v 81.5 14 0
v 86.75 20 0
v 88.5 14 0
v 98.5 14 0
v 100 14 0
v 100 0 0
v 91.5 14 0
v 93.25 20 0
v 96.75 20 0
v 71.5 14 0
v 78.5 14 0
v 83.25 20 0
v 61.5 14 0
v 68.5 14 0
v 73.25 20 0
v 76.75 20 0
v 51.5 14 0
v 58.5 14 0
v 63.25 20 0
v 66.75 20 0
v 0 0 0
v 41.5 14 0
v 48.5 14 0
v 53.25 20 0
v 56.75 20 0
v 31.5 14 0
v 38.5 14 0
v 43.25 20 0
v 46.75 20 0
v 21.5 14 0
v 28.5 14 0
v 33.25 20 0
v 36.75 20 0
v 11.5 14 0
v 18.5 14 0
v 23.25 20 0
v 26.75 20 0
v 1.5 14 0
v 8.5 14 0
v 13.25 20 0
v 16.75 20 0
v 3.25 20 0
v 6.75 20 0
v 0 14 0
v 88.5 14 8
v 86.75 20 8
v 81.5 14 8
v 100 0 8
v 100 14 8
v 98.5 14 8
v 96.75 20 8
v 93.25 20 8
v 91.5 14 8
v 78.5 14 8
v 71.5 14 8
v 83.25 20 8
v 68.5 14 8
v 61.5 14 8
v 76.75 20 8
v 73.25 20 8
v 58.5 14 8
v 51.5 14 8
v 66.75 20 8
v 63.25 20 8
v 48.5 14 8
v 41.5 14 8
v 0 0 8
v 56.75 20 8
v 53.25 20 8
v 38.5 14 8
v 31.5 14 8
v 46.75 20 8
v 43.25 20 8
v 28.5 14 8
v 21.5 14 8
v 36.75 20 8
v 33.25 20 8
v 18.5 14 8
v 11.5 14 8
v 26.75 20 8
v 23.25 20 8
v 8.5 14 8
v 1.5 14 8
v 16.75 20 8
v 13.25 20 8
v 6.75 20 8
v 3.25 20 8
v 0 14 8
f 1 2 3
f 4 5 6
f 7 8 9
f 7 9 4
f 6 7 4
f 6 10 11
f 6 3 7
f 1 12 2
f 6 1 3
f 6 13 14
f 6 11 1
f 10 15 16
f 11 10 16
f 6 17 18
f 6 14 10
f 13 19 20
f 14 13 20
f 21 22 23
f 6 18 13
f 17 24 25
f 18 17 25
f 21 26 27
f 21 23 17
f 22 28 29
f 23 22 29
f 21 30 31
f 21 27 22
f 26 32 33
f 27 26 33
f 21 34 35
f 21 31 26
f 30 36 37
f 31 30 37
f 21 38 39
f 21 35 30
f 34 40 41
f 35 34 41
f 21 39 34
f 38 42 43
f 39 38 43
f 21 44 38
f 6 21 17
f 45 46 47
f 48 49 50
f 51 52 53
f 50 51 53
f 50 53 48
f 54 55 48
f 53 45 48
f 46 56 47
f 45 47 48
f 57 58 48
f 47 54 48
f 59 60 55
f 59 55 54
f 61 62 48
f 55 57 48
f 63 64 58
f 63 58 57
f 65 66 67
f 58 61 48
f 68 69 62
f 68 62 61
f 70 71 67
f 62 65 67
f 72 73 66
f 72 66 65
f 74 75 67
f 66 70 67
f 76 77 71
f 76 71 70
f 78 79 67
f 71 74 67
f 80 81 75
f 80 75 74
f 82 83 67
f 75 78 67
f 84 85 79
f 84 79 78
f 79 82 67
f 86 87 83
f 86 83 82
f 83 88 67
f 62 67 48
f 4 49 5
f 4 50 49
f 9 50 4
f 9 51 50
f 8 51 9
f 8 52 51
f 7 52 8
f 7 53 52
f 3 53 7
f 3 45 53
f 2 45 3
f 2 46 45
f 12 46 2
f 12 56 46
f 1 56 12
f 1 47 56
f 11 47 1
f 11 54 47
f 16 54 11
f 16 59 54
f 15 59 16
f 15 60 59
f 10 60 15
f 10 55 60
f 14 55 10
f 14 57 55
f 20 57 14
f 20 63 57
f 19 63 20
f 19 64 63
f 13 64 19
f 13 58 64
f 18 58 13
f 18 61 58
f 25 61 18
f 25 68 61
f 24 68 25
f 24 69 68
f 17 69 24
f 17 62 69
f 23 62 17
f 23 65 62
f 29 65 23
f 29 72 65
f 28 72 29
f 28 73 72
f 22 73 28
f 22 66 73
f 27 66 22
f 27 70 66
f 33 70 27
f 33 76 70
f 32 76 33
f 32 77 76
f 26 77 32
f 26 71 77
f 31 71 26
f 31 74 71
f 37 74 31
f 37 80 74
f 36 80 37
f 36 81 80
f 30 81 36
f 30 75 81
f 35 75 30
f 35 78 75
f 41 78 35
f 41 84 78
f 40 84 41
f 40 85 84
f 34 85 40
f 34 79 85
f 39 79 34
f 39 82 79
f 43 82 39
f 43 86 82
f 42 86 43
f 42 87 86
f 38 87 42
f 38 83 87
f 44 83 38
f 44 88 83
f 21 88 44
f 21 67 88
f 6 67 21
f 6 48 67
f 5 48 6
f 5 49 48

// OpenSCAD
$fn = 32;

// ----------------------------------------------------------------------
// Gear rack: 10 teeth, pitch 10 mm
// ----------------------------------------------------------------------

// --- parameters (mm) ---
teeth = 10;               // number of teeth
pitch = 10;               // tooth pitch, X
root_w = 7;               // tooth width at the root
tip_w = 3.5;              // tooth width at the tip
base_h = 14;              // rack body height, Y
tooth_h = 6;              // tooth height above the body
plate_t = 8;              // rack width, Z (extrusion height)

rack_l = teeth * pitch;  // overall length
total_h = base_h + tooth_h;  // overall height

profile = [[0, 0], [100, 0], [100, 14], [98.5, 14], [96.75, 20], [93.25, 20], [91.5, 14], [88.5, 14], [86.75, 20], [83.25, 20], [81.5, 14], [78.5, 14], [76.75, 20], [73.25, 20], [71.5, 14], [68.5, 14], [66.75, 20], [63.25, 20], [61.5, 14], [58.5, 14], [56.75, 20], [53.25, 20], [51.5, 14], [48.5, 14], [46.75, 20], [43.25, 20], [41.5, 14], [38.5, 14], [36.75, 20], [33.25, 20], [31.5, 14], [28.5, 14], [26.75, 20], [23.25, 20], [21.5, 14], [18.5, 14], [16.75, 20], [13.25, 20], [11.5, 14], [8.5, 14], [6.75, 20], [3.25, 20], [1.5, 14], [0, 14]];  // primary outline, 44 points, counter clockwise

// --- the one profile operation ---
linear_extrude(height = plate_t) polygon(points = profile);
